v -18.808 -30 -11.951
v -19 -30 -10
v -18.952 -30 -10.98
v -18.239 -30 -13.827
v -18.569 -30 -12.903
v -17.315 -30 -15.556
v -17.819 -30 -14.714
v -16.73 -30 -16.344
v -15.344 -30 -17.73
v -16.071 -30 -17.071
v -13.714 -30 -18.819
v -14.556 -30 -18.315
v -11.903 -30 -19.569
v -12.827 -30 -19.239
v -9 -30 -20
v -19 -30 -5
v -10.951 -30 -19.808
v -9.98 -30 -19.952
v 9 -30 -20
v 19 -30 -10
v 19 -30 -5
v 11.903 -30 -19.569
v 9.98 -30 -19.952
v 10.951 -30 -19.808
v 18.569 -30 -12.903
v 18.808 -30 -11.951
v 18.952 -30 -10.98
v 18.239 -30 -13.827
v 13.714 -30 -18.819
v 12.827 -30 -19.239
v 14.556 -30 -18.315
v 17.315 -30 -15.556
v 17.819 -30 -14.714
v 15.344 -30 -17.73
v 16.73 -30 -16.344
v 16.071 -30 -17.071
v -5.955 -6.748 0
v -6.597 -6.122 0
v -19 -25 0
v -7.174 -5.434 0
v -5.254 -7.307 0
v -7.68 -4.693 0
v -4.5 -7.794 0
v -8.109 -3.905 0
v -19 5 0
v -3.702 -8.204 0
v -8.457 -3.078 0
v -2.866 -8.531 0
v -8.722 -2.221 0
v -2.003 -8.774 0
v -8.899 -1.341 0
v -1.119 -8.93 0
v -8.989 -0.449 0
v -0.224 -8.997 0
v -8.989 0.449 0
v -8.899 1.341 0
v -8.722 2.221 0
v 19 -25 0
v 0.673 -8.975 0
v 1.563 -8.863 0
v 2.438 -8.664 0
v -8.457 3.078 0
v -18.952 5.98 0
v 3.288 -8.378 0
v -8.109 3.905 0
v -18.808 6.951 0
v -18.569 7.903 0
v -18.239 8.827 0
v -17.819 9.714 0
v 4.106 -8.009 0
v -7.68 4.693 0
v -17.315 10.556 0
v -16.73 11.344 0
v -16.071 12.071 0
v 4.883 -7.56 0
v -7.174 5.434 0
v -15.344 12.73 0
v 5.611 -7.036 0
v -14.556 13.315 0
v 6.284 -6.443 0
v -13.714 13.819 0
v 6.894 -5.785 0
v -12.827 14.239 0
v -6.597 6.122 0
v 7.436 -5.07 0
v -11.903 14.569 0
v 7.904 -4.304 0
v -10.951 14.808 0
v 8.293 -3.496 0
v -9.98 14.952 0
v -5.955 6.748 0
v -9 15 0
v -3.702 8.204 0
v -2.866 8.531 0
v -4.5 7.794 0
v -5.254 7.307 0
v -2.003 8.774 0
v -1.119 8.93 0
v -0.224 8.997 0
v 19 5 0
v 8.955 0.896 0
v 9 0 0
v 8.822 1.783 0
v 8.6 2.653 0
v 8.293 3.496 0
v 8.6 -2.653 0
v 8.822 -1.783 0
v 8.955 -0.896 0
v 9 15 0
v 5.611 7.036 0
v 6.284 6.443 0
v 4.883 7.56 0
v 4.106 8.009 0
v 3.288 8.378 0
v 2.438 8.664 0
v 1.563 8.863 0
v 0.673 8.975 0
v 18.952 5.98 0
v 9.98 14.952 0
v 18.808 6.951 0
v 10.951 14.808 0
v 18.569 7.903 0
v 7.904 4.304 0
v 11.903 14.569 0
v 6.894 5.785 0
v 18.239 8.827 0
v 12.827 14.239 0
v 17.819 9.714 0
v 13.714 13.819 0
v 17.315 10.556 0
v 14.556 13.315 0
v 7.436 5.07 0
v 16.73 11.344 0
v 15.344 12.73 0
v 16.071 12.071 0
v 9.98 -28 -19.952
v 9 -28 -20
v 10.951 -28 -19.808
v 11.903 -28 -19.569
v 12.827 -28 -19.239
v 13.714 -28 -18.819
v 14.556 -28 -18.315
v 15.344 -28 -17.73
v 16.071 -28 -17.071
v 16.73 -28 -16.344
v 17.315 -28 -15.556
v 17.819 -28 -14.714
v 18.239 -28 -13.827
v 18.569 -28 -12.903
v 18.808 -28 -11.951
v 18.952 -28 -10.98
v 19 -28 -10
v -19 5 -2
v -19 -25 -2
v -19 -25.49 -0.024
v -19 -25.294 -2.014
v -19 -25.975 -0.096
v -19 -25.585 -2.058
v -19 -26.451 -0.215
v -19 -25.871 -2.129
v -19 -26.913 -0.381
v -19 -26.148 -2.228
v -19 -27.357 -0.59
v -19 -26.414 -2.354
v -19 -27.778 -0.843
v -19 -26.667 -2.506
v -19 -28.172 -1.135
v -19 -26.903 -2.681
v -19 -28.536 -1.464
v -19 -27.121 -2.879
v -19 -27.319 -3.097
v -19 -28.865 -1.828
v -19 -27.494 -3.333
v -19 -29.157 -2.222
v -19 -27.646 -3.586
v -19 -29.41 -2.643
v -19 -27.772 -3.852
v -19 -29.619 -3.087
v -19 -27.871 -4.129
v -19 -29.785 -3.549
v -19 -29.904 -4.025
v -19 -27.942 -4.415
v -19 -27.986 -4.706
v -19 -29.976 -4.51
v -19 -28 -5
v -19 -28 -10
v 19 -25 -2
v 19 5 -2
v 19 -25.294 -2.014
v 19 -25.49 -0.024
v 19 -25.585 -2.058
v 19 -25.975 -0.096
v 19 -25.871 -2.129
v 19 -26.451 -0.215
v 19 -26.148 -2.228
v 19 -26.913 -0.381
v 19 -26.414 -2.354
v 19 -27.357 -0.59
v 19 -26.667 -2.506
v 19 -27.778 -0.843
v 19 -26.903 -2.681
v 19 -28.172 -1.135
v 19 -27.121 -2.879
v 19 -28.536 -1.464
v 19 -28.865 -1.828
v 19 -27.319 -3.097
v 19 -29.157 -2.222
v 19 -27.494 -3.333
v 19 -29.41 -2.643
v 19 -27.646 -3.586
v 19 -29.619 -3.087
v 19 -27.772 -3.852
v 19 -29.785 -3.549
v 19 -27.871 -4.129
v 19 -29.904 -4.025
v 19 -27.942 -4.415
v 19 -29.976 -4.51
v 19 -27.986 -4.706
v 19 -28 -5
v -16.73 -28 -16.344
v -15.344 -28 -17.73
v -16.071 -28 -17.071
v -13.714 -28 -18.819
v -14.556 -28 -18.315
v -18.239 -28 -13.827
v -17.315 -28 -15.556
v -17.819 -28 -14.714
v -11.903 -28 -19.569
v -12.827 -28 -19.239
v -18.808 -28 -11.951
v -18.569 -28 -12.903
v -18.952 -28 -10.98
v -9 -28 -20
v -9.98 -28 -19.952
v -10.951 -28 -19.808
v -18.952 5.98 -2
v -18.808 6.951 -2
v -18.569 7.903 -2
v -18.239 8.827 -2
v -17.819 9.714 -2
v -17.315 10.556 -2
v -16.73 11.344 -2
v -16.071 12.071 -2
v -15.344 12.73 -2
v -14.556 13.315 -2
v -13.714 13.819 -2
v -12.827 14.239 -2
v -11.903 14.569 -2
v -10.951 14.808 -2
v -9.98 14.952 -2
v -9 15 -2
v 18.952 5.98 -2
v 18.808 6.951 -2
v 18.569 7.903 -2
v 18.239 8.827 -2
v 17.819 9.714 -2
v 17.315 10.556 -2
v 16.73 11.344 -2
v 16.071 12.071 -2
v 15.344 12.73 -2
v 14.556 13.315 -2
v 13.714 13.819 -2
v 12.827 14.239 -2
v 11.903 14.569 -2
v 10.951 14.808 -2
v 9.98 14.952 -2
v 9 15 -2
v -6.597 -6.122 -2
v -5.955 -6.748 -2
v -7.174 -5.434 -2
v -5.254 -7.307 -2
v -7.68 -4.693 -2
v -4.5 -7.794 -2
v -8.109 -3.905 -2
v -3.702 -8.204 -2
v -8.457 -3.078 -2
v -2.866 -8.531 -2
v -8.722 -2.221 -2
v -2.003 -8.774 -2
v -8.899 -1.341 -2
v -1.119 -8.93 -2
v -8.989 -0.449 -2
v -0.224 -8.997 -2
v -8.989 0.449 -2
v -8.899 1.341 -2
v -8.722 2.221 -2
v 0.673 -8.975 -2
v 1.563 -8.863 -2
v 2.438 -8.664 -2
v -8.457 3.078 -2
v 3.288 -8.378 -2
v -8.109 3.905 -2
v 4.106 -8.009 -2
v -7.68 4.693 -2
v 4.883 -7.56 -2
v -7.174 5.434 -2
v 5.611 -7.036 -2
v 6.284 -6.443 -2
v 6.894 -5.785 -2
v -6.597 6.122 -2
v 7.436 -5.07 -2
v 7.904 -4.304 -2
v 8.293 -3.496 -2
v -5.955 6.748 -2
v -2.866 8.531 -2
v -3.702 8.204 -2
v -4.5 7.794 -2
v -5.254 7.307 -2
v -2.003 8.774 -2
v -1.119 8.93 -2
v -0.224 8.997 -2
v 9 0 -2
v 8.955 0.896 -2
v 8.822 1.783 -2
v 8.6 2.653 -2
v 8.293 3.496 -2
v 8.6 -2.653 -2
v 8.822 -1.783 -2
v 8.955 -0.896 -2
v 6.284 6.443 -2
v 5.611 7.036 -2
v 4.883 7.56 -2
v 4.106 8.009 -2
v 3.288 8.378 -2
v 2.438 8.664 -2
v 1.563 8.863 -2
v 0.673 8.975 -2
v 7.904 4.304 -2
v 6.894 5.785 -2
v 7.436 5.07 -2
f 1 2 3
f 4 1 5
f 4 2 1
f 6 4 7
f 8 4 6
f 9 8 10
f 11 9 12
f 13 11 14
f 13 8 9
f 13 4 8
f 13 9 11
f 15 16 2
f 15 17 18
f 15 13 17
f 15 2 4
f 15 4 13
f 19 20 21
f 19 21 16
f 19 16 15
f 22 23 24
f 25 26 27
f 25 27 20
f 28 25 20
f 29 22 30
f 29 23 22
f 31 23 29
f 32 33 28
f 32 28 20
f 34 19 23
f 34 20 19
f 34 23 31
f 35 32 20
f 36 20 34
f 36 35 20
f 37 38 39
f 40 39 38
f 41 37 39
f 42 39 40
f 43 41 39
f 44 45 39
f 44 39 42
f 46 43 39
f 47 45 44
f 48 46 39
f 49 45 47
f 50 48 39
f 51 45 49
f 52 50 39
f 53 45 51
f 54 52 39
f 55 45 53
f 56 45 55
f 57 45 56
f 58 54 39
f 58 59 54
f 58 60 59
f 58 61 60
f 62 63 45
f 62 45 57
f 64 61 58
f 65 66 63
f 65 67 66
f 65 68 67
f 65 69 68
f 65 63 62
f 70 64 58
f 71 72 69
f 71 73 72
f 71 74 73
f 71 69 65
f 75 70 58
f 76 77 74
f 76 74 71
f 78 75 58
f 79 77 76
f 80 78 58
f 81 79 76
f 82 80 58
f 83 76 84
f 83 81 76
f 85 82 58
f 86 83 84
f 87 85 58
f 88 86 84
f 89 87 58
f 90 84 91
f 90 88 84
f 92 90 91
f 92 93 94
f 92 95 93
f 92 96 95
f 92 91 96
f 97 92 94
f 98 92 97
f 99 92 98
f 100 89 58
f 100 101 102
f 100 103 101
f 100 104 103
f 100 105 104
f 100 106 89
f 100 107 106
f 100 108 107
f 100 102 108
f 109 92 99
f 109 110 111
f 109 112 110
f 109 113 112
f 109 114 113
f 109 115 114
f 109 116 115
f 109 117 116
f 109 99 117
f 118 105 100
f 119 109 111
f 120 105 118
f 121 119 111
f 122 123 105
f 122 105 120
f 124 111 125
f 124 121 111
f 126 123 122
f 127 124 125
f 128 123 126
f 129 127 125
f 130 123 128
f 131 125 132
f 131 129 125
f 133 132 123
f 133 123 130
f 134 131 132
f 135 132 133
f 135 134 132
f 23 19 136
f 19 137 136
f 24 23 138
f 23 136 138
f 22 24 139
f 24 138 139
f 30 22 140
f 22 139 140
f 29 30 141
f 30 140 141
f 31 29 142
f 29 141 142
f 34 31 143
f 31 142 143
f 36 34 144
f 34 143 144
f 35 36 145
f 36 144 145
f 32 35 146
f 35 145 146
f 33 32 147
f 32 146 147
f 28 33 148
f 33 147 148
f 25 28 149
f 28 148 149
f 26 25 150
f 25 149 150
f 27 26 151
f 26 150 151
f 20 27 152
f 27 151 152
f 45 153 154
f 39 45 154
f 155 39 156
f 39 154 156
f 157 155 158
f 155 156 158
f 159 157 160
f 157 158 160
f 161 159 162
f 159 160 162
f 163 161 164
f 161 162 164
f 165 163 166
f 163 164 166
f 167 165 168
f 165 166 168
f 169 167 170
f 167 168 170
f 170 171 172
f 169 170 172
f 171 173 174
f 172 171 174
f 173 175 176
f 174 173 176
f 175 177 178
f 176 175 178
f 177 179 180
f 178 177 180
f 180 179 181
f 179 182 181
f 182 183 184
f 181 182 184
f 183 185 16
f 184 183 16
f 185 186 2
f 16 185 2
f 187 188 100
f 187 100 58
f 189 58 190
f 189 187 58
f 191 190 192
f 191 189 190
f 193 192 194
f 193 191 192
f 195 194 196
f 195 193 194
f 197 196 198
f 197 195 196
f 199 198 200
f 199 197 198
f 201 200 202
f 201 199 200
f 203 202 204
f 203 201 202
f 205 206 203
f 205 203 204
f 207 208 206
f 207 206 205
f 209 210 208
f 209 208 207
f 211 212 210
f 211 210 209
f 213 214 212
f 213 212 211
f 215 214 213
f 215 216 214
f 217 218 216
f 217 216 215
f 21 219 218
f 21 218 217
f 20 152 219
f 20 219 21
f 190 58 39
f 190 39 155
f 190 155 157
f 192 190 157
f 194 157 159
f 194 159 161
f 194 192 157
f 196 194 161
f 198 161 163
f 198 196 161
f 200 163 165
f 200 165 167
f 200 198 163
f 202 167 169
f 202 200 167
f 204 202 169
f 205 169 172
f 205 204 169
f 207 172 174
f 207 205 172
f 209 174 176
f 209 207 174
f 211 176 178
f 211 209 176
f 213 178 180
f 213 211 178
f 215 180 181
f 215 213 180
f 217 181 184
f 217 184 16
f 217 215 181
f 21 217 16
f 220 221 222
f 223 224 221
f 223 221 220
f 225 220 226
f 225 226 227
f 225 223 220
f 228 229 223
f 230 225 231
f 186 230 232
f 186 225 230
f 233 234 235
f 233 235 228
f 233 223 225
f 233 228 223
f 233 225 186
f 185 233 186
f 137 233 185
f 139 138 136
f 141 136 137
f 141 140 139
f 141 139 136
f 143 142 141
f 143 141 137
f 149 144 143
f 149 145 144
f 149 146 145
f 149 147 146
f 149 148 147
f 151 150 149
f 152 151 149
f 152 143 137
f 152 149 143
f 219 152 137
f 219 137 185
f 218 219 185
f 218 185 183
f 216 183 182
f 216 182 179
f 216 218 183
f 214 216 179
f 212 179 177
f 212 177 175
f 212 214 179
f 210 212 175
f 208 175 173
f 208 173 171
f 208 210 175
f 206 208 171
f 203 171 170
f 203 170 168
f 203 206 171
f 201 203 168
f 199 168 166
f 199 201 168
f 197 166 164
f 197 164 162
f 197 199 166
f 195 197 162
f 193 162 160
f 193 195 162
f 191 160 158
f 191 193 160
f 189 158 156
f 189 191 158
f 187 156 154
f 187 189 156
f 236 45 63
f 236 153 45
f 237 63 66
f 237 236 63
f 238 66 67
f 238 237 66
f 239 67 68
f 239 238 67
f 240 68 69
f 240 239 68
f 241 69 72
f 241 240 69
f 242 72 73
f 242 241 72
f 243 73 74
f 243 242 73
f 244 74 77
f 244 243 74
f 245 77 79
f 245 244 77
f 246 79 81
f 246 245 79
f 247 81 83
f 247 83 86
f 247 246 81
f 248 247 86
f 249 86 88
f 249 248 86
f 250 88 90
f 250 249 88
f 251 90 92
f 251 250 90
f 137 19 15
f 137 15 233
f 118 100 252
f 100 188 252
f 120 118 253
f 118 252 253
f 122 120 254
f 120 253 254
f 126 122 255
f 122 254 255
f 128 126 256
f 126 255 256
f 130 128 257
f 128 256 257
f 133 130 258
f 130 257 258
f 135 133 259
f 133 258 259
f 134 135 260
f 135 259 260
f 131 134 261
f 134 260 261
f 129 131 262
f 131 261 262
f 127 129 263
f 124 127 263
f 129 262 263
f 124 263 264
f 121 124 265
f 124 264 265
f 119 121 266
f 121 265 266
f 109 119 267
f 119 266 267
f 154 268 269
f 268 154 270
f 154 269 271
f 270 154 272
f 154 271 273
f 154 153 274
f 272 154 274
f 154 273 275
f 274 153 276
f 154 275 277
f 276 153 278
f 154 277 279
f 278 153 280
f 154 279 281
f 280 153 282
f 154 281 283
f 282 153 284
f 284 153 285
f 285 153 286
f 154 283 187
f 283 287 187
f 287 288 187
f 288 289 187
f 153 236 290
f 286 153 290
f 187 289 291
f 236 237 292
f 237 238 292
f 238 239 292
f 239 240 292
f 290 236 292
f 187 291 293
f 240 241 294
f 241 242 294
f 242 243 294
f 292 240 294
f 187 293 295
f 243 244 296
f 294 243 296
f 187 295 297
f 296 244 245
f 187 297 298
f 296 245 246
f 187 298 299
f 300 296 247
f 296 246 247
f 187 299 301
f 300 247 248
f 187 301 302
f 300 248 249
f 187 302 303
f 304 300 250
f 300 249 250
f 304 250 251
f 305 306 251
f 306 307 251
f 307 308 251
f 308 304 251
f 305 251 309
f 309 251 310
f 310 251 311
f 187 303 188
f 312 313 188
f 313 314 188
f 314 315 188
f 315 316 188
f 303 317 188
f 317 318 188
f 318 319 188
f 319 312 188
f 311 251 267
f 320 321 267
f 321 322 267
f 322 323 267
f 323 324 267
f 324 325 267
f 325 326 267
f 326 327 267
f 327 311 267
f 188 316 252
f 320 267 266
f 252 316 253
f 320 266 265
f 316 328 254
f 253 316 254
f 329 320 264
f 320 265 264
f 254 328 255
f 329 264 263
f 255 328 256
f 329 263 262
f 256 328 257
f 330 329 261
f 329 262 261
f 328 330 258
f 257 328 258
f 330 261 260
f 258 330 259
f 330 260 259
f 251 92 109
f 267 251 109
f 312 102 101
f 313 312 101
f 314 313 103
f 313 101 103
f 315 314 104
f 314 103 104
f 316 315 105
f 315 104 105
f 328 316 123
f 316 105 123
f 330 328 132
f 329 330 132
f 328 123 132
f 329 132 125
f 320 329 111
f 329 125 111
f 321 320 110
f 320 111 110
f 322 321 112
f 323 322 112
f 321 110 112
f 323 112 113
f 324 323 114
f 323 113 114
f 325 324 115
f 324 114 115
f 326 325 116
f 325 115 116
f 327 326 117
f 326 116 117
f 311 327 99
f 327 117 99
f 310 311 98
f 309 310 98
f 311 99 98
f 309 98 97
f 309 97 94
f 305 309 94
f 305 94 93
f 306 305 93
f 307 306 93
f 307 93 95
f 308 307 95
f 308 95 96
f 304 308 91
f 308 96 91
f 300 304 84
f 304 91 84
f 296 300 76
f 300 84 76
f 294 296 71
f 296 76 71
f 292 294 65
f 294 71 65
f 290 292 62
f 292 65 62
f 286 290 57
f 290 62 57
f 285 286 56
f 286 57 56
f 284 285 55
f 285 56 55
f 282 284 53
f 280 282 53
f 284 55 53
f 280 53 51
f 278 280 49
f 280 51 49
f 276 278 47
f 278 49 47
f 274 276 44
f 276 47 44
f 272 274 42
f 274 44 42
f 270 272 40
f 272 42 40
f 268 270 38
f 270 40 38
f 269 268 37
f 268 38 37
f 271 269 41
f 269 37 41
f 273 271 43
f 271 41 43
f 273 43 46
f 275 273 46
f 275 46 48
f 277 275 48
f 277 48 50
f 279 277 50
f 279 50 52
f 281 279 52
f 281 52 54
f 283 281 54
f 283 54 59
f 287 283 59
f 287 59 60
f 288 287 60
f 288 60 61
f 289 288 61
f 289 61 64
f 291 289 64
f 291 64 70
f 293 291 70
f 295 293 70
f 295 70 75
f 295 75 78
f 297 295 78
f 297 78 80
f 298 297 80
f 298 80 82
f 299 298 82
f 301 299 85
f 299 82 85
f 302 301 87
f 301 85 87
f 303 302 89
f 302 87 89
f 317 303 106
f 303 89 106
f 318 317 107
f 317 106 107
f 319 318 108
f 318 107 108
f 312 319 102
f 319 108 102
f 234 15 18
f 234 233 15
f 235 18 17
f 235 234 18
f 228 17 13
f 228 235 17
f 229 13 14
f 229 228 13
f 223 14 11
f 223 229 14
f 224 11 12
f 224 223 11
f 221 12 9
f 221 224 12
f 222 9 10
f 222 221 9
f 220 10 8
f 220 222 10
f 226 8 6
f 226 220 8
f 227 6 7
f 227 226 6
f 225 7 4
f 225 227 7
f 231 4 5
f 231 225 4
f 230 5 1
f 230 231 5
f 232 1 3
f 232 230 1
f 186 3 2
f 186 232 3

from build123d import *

# Parameters (mm, degrees)
SKETCH_1_W             = 38
SKETCH_1_H             = 40
SKETCH_1_R             = 9
SM_BASE_FLANGE_1_DEPTH = 2
SM_EDGE_FLANGE_1_DEPTH = 38
FILLET_1_R             = 10


# Sheet-metal steps are written as plain solids
with BuildPart() as part:
    # Sketch 1 → 基体-法兰1 (new body)
    with BuildSketch(Plane.XY):
        with Locations((0, -5)):
            Rectangle(SKETCH_1_W, SKETCH_1_H)
        Circle(SKETCH_1_R, mode=Mode.SUBTRACT)
    extrude(amount=-SM_BASE_FLANGE_1_DEPTH)

    # 边线-法兰1 section (across the edge) → 边线-法兰1 (add)
    with BuildSketch(Plane(origin=(19, -28, -2), x_dir=(0, 1, 0), z_dir=(-1, 0, 0))):
        with BuildLine():
            Line((-2, 3), (-2, 18))
            Line((-2, 18), (0, 18))
            Line((0, 18), (0, 3))
            ThreePointArc((0, 3), (0.878679656, 0.878679656), (3, 0))
            Line((3, 0), (3, -2))
            ThreePointArc((3, -2), (-0.535533906, -0.535533906), (-2, 3))
        make_face()
    extrude(amount=SM_EDGE_FLANGE_1_DEPTH)

    # 圆角1
    fillet_1_edges = [part.edges().sort_by_distance(p)[0] for p in [
        (19, -29, -20),
        (-19, -29, -20),
        (19, 15, -1),
        (-19, 15, -1),
    ]]
    fillet(fillet_1_edges, radius=FILLET_1_R)


solid = part.part
